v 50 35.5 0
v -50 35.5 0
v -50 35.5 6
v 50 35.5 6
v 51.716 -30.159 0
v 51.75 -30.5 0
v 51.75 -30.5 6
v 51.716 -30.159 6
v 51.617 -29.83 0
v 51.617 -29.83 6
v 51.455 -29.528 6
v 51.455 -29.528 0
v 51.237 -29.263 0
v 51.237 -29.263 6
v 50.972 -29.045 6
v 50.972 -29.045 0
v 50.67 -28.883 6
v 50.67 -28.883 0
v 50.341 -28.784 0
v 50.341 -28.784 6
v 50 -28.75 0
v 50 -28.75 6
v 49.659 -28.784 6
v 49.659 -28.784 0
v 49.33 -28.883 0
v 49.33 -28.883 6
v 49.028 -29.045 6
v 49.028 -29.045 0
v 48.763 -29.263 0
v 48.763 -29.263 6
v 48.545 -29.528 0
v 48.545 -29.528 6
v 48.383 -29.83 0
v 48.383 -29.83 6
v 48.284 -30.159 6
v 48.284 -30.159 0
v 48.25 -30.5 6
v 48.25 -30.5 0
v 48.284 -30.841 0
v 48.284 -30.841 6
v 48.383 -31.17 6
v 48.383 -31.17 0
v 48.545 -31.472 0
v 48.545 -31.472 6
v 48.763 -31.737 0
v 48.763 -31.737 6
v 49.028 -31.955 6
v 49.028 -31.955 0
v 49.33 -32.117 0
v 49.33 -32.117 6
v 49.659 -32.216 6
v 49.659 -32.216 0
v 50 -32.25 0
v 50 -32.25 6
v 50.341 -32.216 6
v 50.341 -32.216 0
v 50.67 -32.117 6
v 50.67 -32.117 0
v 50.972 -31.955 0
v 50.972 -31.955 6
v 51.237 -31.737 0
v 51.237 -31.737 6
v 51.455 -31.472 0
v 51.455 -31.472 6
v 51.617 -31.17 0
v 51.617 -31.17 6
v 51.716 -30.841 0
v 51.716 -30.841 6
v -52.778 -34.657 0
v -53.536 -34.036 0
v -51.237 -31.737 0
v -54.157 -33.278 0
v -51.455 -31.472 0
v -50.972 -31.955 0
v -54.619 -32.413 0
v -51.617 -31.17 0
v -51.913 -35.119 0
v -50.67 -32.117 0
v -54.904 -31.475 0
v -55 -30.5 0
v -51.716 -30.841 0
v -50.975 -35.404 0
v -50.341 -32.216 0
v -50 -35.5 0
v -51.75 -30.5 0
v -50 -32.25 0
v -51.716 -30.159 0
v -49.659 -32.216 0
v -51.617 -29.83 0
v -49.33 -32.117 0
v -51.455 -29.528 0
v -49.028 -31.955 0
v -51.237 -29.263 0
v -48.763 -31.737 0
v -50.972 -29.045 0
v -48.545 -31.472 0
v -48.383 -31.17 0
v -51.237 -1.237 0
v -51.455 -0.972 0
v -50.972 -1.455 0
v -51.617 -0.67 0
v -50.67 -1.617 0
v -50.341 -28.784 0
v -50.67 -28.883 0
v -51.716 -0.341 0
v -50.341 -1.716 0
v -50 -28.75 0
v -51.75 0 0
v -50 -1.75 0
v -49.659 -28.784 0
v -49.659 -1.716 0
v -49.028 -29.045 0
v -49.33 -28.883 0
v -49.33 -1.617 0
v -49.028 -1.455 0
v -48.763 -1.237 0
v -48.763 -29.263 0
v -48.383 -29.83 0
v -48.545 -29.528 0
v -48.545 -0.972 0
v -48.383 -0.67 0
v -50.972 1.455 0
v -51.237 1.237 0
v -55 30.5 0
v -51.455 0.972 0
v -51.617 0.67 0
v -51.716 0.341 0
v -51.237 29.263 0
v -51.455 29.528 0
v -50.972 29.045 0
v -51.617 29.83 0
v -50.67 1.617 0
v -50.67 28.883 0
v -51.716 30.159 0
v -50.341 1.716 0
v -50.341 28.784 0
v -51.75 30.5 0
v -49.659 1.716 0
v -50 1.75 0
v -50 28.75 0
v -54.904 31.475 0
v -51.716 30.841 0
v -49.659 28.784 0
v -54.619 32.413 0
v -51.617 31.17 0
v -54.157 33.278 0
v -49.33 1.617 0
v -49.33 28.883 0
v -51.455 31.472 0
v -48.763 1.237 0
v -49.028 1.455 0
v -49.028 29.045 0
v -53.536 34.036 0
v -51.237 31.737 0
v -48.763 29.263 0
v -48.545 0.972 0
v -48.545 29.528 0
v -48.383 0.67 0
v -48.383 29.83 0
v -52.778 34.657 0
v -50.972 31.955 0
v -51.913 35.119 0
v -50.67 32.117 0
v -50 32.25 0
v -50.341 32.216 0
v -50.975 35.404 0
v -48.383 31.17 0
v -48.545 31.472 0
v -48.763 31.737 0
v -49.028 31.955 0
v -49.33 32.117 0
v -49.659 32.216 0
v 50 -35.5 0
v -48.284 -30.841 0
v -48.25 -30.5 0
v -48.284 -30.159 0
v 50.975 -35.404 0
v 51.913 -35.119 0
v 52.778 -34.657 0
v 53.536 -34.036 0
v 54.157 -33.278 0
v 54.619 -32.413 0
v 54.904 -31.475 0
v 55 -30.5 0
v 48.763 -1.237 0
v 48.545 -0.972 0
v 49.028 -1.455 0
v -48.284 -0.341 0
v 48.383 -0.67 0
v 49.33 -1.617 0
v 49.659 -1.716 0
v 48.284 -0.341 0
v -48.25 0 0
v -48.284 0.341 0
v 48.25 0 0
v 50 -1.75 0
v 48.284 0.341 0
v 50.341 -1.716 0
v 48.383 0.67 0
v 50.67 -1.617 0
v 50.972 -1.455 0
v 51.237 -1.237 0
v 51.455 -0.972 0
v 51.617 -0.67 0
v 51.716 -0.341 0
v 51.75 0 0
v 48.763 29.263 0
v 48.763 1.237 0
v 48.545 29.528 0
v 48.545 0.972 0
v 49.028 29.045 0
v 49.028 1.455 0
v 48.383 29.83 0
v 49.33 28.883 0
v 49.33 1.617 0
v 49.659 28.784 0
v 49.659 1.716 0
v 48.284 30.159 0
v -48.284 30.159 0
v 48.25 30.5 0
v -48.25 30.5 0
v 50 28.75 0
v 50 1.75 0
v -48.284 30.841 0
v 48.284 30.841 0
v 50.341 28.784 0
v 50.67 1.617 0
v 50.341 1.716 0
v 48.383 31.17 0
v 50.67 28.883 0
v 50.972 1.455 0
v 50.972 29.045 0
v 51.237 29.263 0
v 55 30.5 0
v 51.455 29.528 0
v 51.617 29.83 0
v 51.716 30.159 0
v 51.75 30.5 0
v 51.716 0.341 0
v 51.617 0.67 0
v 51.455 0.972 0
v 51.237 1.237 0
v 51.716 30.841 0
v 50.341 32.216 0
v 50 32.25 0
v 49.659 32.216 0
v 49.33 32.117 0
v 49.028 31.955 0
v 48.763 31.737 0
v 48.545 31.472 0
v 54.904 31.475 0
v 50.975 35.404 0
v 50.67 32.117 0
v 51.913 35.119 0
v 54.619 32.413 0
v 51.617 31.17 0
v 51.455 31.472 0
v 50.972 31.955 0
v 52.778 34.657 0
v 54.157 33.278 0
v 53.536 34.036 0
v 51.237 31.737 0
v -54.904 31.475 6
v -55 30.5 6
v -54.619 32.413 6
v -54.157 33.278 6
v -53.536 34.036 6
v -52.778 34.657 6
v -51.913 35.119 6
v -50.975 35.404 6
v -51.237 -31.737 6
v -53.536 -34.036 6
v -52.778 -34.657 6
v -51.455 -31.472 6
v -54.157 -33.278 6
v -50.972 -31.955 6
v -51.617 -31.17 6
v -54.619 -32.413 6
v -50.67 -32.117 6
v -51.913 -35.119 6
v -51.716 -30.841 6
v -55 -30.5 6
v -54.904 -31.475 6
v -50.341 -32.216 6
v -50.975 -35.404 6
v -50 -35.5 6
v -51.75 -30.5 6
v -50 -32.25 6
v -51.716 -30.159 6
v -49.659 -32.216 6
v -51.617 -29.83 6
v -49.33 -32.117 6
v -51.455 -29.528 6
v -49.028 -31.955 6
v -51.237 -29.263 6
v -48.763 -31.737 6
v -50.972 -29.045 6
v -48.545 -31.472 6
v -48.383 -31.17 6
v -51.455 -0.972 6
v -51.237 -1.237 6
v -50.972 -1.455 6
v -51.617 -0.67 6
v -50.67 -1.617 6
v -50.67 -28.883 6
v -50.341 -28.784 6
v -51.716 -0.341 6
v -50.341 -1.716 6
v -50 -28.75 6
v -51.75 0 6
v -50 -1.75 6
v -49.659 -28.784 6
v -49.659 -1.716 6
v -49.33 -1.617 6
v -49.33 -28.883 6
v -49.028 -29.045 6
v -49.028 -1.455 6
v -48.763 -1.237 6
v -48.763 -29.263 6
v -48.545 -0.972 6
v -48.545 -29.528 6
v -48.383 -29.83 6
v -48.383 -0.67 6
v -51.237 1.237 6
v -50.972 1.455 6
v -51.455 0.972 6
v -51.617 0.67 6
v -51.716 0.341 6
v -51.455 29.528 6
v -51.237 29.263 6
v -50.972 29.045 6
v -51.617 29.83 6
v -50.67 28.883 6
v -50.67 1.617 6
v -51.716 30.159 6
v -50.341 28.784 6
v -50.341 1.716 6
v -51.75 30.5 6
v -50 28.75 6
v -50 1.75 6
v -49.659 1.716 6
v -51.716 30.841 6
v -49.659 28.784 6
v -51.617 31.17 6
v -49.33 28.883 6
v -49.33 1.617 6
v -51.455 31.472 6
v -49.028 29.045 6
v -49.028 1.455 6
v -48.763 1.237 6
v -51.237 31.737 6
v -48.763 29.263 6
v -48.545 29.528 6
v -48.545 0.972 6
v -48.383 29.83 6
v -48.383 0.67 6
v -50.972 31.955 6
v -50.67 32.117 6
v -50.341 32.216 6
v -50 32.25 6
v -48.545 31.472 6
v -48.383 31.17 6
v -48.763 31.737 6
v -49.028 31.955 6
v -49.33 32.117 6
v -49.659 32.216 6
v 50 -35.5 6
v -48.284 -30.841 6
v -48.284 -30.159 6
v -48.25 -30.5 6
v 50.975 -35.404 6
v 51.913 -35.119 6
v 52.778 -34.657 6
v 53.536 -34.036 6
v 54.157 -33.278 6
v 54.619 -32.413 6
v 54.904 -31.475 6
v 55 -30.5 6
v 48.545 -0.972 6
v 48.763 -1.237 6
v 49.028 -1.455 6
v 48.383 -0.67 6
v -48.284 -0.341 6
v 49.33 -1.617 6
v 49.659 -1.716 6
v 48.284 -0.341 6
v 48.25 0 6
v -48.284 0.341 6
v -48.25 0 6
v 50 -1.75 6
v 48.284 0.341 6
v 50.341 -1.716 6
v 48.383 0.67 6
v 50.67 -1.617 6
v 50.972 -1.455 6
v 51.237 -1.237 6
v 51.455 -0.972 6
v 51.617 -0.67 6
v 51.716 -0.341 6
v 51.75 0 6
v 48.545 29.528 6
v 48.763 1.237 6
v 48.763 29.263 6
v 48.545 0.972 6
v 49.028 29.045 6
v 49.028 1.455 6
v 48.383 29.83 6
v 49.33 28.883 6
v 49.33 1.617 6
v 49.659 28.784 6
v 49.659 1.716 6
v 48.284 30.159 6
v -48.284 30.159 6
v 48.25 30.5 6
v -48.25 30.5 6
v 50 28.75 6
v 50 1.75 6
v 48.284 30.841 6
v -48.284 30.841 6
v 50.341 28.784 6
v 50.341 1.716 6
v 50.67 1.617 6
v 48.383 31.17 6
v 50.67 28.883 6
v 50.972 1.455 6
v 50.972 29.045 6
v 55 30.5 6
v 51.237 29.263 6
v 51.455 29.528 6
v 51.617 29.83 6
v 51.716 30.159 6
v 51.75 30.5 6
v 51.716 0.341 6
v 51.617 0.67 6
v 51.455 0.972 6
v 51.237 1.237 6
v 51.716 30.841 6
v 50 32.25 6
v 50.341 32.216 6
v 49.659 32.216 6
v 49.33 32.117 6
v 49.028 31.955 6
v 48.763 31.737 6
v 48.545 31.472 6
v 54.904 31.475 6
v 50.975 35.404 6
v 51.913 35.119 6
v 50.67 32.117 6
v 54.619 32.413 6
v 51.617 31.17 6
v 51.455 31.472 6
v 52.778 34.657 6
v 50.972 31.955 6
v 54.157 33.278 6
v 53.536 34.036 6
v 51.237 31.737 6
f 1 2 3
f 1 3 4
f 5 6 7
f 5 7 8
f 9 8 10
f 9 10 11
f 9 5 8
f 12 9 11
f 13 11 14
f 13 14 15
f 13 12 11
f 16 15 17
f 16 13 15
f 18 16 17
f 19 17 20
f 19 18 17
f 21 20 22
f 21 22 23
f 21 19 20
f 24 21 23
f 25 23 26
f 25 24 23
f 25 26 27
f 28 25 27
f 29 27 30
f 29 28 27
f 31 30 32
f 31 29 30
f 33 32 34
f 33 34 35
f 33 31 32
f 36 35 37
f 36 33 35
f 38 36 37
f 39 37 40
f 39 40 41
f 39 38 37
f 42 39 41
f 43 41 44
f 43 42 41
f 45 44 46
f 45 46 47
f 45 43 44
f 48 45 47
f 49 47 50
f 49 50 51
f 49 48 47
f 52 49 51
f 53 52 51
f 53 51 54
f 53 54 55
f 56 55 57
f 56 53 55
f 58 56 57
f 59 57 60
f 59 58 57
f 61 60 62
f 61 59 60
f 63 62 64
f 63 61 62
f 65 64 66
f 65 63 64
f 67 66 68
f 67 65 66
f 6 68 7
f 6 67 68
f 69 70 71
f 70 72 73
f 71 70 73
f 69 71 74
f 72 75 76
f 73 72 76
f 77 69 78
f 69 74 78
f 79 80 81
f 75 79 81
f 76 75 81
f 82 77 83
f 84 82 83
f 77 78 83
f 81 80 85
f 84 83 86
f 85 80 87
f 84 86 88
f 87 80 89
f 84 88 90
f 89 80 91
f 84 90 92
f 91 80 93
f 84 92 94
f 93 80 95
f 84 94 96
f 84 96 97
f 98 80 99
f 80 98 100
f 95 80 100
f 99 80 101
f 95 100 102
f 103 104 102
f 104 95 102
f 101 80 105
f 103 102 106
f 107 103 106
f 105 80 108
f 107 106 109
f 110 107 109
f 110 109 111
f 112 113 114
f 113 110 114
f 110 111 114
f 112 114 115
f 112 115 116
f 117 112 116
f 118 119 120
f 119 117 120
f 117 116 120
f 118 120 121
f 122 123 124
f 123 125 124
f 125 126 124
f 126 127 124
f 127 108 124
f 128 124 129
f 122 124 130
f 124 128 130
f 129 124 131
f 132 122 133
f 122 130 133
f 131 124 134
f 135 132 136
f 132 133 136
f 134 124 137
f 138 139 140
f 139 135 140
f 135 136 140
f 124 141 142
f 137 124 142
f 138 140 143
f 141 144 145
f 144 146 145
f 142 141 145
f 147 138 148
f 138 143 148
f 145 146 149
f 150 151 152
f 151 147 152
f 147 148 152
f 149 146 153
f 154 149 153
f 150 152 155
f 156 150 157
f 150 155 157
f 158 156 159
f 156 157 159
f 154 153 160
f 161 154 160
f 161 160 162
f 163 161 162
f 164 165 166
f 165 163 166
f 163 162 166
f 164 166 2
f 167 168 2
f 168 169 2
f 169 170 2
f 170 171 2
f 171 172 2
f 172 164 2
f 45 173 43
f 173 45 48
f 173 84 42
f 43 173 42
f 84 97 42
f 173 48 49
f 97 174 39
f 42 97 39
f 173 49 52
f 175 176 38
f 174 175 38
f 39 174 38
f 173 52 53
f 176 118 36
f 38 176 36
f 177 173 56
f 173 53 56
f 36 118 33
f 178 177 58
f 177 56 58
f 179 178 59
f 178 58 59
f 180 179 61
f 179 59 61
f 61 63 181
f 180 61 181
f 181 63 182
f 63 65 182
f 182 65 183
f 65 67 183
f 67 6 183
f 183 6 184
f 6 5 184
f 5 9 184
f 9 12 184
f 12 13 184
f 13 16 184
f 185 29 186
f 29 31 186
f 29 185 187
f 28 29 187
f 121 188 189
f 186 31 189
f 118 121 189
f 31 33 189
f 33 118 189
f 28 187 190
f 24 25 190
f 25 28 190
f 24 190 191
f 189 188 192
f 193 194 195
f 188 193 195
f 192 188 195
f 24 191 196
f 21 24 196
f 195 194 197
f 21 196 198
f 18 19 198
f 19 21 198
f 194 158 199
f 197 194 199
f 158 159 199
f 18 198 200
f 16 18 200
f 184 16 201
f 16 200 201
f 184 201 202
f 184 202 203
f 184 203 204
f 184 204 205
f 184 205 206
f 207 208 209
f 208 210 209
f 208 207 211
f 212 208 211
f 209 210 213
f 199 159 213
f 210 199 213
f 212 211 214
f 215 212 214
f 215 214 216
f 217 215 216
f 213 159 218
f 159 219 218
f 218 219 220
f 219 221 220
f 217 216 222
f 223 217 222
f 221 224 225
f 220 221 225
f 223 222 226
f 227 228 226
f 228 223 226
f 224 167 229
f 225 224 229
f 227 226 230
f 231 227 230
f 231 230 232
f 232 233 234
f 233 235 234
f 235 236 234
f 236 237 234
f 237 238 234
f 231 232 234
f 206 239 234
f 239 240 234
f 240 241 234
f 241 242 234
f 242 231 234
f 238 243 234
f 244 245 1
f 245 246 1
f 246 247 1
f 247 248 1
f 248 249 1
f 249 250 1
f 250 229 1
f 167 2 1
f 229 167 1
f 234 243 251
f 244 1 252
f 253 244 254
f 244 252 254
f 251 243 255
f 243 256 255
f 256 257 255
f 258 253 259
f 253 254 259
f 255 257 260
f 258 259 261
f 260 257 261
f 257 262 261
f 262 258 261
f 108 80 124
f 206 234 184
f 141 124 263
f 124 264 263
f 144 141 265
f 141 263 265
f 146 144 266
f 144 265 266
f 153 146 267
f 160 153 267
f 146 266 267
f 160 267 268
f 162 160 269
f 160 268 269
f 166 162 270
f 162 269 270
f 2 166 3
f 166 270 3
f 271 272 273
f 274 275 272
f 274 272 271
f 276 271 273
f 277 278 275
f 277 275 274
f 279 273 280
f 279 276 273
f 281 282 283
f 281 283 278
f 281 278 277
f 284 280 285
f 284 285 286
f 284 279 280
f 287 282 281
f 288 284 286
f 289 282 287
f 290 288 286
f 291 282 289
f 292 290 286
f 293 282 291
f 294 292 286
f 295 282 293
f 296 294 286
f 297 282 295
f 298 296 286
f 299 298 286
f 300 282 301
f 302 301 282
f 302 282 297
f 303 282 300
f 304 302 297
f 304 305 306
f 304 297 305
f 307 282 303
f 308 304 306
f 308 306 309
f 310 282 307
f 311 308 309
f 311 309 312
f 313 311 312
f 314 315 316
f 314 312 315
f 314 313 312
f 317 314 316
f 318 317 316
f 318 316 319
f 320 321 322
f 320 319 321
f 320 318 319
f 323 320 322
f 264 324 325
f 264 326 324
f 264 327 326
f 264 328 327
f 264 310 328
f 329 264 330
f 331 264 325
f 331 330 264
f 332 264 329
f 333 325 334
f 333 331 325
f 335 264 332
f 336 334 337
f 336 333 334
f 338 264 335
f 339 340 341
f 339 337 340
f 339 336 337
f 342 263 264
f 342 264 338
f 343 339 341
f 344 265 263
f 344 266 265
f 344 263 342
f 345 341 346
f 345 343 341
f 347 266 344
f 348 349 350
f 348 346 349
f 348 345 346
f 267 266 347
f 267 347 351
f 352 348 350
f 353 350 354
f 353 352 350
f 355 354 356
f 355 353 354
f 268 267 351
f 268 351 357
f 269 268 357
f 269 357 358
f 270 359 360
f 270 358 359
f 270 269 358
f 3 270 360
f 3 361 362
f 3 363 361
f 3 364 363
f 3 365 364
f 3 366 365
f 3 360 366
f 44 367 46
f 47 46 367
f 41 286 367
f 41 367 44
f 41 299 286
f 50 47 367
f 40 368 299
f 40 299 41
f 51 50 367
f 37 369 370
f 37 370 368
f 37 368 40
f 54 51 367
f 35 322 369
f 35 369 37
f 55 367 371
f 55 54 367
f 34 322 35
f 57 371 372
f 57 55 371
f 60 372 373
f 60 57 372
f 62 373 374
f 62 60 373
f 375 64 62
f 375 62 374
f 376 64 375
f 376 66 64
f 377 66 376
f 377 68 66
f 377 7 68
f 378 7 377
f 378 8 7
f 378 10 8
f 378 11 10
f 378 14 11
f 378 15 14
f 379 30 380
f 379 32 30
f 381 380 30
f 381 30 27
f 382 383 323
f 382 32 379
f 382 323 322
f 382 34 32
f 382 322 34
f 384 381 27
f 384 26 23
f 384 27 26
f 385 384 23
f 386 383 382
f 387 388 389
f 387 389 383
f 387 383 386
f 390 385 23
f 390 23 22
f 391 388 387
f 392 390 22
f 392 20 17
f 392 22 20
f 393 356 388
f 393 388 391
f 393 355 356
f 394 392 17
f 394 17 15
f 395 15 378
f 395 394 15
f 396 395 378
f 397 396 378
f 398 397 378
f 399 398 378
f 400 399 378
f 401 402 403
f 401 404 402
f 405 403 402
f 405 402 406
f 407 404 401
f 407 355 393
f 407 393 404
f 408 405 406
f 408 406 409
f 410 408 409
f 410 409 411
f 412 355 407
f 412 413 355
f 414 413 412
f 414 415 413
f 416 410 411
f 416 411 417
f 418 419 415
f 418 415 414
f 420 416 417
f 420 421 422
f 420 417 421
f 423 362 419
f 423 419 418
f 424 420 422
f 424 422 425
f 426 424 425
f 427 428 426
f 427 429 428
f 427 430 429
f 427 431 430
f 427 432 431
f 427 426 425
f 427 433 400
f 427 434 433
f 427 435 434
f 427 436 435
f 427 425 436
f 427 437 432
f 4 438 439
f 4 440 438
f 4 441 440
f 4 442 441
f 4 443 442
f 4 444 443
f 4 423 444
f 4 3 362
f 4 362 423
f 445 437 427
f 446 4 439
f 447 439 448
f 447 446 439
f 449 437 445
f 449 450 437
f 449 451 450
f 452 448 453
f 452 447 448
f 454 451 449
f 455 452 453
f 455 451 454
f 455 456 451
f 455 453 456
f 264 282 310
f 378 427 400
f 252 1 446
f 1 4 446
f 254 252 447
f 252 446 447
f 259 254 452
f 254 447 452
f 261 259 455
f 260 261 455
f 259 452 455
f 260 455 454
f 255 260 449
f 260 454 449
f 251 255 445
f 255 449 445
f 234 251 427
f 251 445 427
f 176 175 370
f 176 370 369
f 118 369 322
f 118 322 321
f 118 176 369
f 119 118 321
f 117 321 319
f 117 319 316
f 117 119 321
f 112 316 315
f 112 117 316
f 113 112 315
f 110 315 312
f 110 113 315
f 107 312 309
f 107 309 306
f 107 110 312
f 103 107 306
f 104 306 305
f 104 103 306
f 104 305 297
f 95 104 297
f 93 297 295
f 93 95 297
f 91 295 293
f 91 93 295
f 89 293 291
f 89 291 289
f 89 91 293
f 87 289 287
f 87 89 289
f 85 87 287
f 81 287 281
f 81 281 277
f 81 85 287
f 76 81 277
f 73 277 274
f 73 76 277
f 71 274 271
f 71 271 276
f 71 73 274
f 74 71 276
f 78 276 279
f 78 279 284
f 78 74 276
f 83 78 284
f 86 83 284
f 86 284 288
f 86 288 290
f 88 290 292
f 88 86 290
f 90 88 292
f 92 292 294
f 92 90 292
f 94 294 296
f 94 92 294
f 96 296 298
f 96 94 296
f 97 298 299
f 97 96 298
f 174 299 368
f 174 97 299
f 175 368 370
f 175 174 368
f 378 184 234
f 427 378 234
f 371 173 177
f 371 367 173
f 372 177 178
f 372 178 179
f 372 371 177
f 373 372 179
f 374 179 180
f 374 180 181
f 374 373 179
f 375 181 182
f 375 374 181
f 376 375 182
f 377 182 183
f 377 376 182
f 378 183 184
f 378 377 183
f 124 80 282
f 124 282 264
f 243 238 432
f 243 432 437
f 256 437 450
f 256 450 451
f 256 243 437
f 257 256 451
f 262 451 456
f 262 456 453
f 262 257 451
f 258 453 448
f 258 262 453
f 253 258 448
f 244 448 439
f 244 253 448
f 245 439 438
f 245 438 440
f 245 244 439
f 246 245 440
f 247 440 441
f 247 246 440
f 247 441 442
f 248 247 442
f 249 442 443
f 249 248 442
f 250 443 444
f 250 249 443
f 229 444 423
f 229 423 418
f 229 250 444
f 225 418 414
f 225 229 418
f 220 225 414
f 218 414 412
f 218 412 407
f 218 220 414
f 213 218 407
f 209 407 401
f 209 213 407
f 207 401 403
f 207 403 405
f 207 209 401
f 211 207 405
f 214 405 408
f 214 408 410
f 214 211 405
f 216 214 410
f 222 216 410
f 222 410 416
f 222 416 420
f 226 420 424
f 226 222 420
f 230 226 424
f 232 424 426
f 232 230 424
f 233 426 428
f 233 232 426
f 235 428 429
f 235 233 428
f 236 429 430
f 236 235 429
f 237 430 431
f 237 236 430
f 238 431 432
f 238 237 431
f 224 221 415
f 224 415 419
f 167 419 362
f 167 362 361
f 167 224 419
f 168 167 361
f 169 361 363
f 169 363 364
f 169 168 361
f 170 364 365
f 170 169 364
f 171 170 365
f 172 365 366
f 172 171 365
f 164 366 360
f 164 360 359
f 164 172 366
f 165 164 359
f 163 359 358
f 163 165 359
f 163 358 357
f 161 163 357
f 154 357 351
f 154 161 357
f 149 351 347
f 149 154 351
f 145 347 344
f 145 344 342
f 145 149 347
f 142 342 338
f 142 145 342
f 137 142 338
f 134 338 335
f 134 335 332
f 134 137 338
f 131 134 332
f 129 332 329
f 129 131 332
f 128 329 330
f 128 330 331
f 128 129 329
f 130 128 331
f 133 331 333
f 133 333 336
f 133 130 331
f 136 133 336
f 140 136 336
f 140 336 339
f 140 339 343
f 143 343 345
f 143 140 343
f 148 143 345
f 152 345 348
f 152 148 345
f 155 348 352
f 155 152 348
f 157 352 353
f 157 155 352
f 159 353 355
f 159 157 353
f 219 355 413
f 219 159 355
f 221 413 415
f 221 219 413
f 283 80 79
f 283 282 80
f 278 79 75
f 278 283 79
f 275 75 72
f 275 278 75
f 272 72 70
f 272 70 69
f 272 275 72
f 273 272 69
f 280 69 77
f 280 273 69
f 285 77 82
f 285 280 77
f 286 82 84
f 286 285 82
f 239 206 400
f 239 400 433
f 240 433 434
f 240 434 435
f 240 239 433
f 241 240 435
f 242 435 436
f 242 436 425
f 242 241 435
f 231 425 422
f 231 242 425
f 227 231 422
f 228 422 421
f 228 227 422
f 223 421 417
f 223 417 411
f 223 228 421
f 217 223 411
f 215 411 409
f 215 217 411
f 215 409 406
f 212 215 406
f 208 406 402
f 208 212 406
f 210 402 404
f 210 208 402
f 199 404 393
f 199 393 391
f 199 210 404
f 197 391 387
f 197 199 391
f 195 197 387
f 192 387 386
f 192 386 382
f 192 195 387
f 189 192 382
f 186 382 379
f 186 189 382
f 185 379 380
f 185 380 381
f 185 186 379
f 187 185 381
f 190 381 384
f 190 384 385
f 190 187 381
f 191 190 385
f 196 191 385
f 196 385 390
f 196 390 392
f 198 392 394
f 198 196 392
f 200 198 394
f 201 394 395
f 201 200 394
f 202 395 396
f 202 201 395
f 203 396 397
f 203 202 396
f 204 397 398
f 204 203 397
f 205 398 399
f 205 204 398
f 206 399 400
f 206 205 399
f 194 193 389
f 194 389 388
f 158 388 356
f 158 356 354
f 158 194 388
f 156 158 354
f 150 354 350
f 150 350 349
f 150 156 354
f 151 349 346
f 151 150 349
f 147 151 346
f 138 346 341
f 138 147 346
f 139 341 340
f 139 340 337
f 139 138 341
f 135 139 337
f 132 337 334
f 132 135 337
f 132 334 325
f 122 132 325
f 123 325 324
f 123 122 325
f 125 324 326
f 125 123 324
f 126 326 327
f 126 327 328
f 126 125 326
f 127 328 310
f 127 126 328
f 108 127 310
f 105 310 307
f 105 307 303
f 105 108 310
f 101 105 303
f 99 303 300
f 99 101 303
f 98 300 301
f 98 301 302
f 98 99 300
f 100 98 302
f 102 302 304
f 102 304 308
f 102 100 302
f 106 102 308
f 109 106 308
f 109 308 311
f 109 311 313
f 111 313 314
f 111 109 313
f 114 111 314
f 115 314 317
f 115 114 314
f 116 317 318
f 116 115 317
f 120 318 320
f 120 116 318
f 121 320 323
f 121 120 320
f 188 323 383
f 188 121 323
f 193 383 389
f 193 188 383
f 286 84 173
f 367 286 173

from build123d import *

# Parameters (mm, degrees)
ESQUISSE1_W        = 110
ESQUISSE1_H        = 71
ESQUISSE1_R        = 1.75
BOSS_EXTRU_1_DEPTH = 6
CONG_1_R           = 5


with BuildPart() as part:
    # Esquisse1 → Boss.-Extru.1 (new body)
    with BuildSketch(Plane.XY):
        Rectangle(ESQUISSE1_W, ESQUISSE1_H)
        with Locations((-50, 30.5)):
            Circle(ESQUISSE1_R, mode=Mode.SUBTRACT)
        with Locations((50, 30.5)):
            Circle(ESQUISSE1_R, mode=Mode.SUBTRACT)
        with Locations((50, -30.5)):
            Circle(ESQUISSE1_R, mode=Mode.SUBTRACT)
        with Locations((-50, -30.5)):
            Circle(ESQUISSE1_R, mode=Mode.SUBTRACT)
        with Locations((-50, 0)):
            Circle(ESQUISSE1_R, mode=Mode.SUBTRACT)
        with Locations((50, 0)):
            Circle(ESQUISSE1_R, mode=Mode.SUBTRACT)
    extrude(amount=BOSS_EXTRU_1_DEPTH)

    # Congé1
    cong_1_edges = [part.edges().sort_by_distance(p)[0] for p in [
        (-55, 35.5, 3),
        (55, 35.5, 3),
        (55, -35.5, 3),
        (-55, -35.5, 3),
    ]]
    fillet(cong_1_edges, radius=CONG_1_R)


solid = part.part
